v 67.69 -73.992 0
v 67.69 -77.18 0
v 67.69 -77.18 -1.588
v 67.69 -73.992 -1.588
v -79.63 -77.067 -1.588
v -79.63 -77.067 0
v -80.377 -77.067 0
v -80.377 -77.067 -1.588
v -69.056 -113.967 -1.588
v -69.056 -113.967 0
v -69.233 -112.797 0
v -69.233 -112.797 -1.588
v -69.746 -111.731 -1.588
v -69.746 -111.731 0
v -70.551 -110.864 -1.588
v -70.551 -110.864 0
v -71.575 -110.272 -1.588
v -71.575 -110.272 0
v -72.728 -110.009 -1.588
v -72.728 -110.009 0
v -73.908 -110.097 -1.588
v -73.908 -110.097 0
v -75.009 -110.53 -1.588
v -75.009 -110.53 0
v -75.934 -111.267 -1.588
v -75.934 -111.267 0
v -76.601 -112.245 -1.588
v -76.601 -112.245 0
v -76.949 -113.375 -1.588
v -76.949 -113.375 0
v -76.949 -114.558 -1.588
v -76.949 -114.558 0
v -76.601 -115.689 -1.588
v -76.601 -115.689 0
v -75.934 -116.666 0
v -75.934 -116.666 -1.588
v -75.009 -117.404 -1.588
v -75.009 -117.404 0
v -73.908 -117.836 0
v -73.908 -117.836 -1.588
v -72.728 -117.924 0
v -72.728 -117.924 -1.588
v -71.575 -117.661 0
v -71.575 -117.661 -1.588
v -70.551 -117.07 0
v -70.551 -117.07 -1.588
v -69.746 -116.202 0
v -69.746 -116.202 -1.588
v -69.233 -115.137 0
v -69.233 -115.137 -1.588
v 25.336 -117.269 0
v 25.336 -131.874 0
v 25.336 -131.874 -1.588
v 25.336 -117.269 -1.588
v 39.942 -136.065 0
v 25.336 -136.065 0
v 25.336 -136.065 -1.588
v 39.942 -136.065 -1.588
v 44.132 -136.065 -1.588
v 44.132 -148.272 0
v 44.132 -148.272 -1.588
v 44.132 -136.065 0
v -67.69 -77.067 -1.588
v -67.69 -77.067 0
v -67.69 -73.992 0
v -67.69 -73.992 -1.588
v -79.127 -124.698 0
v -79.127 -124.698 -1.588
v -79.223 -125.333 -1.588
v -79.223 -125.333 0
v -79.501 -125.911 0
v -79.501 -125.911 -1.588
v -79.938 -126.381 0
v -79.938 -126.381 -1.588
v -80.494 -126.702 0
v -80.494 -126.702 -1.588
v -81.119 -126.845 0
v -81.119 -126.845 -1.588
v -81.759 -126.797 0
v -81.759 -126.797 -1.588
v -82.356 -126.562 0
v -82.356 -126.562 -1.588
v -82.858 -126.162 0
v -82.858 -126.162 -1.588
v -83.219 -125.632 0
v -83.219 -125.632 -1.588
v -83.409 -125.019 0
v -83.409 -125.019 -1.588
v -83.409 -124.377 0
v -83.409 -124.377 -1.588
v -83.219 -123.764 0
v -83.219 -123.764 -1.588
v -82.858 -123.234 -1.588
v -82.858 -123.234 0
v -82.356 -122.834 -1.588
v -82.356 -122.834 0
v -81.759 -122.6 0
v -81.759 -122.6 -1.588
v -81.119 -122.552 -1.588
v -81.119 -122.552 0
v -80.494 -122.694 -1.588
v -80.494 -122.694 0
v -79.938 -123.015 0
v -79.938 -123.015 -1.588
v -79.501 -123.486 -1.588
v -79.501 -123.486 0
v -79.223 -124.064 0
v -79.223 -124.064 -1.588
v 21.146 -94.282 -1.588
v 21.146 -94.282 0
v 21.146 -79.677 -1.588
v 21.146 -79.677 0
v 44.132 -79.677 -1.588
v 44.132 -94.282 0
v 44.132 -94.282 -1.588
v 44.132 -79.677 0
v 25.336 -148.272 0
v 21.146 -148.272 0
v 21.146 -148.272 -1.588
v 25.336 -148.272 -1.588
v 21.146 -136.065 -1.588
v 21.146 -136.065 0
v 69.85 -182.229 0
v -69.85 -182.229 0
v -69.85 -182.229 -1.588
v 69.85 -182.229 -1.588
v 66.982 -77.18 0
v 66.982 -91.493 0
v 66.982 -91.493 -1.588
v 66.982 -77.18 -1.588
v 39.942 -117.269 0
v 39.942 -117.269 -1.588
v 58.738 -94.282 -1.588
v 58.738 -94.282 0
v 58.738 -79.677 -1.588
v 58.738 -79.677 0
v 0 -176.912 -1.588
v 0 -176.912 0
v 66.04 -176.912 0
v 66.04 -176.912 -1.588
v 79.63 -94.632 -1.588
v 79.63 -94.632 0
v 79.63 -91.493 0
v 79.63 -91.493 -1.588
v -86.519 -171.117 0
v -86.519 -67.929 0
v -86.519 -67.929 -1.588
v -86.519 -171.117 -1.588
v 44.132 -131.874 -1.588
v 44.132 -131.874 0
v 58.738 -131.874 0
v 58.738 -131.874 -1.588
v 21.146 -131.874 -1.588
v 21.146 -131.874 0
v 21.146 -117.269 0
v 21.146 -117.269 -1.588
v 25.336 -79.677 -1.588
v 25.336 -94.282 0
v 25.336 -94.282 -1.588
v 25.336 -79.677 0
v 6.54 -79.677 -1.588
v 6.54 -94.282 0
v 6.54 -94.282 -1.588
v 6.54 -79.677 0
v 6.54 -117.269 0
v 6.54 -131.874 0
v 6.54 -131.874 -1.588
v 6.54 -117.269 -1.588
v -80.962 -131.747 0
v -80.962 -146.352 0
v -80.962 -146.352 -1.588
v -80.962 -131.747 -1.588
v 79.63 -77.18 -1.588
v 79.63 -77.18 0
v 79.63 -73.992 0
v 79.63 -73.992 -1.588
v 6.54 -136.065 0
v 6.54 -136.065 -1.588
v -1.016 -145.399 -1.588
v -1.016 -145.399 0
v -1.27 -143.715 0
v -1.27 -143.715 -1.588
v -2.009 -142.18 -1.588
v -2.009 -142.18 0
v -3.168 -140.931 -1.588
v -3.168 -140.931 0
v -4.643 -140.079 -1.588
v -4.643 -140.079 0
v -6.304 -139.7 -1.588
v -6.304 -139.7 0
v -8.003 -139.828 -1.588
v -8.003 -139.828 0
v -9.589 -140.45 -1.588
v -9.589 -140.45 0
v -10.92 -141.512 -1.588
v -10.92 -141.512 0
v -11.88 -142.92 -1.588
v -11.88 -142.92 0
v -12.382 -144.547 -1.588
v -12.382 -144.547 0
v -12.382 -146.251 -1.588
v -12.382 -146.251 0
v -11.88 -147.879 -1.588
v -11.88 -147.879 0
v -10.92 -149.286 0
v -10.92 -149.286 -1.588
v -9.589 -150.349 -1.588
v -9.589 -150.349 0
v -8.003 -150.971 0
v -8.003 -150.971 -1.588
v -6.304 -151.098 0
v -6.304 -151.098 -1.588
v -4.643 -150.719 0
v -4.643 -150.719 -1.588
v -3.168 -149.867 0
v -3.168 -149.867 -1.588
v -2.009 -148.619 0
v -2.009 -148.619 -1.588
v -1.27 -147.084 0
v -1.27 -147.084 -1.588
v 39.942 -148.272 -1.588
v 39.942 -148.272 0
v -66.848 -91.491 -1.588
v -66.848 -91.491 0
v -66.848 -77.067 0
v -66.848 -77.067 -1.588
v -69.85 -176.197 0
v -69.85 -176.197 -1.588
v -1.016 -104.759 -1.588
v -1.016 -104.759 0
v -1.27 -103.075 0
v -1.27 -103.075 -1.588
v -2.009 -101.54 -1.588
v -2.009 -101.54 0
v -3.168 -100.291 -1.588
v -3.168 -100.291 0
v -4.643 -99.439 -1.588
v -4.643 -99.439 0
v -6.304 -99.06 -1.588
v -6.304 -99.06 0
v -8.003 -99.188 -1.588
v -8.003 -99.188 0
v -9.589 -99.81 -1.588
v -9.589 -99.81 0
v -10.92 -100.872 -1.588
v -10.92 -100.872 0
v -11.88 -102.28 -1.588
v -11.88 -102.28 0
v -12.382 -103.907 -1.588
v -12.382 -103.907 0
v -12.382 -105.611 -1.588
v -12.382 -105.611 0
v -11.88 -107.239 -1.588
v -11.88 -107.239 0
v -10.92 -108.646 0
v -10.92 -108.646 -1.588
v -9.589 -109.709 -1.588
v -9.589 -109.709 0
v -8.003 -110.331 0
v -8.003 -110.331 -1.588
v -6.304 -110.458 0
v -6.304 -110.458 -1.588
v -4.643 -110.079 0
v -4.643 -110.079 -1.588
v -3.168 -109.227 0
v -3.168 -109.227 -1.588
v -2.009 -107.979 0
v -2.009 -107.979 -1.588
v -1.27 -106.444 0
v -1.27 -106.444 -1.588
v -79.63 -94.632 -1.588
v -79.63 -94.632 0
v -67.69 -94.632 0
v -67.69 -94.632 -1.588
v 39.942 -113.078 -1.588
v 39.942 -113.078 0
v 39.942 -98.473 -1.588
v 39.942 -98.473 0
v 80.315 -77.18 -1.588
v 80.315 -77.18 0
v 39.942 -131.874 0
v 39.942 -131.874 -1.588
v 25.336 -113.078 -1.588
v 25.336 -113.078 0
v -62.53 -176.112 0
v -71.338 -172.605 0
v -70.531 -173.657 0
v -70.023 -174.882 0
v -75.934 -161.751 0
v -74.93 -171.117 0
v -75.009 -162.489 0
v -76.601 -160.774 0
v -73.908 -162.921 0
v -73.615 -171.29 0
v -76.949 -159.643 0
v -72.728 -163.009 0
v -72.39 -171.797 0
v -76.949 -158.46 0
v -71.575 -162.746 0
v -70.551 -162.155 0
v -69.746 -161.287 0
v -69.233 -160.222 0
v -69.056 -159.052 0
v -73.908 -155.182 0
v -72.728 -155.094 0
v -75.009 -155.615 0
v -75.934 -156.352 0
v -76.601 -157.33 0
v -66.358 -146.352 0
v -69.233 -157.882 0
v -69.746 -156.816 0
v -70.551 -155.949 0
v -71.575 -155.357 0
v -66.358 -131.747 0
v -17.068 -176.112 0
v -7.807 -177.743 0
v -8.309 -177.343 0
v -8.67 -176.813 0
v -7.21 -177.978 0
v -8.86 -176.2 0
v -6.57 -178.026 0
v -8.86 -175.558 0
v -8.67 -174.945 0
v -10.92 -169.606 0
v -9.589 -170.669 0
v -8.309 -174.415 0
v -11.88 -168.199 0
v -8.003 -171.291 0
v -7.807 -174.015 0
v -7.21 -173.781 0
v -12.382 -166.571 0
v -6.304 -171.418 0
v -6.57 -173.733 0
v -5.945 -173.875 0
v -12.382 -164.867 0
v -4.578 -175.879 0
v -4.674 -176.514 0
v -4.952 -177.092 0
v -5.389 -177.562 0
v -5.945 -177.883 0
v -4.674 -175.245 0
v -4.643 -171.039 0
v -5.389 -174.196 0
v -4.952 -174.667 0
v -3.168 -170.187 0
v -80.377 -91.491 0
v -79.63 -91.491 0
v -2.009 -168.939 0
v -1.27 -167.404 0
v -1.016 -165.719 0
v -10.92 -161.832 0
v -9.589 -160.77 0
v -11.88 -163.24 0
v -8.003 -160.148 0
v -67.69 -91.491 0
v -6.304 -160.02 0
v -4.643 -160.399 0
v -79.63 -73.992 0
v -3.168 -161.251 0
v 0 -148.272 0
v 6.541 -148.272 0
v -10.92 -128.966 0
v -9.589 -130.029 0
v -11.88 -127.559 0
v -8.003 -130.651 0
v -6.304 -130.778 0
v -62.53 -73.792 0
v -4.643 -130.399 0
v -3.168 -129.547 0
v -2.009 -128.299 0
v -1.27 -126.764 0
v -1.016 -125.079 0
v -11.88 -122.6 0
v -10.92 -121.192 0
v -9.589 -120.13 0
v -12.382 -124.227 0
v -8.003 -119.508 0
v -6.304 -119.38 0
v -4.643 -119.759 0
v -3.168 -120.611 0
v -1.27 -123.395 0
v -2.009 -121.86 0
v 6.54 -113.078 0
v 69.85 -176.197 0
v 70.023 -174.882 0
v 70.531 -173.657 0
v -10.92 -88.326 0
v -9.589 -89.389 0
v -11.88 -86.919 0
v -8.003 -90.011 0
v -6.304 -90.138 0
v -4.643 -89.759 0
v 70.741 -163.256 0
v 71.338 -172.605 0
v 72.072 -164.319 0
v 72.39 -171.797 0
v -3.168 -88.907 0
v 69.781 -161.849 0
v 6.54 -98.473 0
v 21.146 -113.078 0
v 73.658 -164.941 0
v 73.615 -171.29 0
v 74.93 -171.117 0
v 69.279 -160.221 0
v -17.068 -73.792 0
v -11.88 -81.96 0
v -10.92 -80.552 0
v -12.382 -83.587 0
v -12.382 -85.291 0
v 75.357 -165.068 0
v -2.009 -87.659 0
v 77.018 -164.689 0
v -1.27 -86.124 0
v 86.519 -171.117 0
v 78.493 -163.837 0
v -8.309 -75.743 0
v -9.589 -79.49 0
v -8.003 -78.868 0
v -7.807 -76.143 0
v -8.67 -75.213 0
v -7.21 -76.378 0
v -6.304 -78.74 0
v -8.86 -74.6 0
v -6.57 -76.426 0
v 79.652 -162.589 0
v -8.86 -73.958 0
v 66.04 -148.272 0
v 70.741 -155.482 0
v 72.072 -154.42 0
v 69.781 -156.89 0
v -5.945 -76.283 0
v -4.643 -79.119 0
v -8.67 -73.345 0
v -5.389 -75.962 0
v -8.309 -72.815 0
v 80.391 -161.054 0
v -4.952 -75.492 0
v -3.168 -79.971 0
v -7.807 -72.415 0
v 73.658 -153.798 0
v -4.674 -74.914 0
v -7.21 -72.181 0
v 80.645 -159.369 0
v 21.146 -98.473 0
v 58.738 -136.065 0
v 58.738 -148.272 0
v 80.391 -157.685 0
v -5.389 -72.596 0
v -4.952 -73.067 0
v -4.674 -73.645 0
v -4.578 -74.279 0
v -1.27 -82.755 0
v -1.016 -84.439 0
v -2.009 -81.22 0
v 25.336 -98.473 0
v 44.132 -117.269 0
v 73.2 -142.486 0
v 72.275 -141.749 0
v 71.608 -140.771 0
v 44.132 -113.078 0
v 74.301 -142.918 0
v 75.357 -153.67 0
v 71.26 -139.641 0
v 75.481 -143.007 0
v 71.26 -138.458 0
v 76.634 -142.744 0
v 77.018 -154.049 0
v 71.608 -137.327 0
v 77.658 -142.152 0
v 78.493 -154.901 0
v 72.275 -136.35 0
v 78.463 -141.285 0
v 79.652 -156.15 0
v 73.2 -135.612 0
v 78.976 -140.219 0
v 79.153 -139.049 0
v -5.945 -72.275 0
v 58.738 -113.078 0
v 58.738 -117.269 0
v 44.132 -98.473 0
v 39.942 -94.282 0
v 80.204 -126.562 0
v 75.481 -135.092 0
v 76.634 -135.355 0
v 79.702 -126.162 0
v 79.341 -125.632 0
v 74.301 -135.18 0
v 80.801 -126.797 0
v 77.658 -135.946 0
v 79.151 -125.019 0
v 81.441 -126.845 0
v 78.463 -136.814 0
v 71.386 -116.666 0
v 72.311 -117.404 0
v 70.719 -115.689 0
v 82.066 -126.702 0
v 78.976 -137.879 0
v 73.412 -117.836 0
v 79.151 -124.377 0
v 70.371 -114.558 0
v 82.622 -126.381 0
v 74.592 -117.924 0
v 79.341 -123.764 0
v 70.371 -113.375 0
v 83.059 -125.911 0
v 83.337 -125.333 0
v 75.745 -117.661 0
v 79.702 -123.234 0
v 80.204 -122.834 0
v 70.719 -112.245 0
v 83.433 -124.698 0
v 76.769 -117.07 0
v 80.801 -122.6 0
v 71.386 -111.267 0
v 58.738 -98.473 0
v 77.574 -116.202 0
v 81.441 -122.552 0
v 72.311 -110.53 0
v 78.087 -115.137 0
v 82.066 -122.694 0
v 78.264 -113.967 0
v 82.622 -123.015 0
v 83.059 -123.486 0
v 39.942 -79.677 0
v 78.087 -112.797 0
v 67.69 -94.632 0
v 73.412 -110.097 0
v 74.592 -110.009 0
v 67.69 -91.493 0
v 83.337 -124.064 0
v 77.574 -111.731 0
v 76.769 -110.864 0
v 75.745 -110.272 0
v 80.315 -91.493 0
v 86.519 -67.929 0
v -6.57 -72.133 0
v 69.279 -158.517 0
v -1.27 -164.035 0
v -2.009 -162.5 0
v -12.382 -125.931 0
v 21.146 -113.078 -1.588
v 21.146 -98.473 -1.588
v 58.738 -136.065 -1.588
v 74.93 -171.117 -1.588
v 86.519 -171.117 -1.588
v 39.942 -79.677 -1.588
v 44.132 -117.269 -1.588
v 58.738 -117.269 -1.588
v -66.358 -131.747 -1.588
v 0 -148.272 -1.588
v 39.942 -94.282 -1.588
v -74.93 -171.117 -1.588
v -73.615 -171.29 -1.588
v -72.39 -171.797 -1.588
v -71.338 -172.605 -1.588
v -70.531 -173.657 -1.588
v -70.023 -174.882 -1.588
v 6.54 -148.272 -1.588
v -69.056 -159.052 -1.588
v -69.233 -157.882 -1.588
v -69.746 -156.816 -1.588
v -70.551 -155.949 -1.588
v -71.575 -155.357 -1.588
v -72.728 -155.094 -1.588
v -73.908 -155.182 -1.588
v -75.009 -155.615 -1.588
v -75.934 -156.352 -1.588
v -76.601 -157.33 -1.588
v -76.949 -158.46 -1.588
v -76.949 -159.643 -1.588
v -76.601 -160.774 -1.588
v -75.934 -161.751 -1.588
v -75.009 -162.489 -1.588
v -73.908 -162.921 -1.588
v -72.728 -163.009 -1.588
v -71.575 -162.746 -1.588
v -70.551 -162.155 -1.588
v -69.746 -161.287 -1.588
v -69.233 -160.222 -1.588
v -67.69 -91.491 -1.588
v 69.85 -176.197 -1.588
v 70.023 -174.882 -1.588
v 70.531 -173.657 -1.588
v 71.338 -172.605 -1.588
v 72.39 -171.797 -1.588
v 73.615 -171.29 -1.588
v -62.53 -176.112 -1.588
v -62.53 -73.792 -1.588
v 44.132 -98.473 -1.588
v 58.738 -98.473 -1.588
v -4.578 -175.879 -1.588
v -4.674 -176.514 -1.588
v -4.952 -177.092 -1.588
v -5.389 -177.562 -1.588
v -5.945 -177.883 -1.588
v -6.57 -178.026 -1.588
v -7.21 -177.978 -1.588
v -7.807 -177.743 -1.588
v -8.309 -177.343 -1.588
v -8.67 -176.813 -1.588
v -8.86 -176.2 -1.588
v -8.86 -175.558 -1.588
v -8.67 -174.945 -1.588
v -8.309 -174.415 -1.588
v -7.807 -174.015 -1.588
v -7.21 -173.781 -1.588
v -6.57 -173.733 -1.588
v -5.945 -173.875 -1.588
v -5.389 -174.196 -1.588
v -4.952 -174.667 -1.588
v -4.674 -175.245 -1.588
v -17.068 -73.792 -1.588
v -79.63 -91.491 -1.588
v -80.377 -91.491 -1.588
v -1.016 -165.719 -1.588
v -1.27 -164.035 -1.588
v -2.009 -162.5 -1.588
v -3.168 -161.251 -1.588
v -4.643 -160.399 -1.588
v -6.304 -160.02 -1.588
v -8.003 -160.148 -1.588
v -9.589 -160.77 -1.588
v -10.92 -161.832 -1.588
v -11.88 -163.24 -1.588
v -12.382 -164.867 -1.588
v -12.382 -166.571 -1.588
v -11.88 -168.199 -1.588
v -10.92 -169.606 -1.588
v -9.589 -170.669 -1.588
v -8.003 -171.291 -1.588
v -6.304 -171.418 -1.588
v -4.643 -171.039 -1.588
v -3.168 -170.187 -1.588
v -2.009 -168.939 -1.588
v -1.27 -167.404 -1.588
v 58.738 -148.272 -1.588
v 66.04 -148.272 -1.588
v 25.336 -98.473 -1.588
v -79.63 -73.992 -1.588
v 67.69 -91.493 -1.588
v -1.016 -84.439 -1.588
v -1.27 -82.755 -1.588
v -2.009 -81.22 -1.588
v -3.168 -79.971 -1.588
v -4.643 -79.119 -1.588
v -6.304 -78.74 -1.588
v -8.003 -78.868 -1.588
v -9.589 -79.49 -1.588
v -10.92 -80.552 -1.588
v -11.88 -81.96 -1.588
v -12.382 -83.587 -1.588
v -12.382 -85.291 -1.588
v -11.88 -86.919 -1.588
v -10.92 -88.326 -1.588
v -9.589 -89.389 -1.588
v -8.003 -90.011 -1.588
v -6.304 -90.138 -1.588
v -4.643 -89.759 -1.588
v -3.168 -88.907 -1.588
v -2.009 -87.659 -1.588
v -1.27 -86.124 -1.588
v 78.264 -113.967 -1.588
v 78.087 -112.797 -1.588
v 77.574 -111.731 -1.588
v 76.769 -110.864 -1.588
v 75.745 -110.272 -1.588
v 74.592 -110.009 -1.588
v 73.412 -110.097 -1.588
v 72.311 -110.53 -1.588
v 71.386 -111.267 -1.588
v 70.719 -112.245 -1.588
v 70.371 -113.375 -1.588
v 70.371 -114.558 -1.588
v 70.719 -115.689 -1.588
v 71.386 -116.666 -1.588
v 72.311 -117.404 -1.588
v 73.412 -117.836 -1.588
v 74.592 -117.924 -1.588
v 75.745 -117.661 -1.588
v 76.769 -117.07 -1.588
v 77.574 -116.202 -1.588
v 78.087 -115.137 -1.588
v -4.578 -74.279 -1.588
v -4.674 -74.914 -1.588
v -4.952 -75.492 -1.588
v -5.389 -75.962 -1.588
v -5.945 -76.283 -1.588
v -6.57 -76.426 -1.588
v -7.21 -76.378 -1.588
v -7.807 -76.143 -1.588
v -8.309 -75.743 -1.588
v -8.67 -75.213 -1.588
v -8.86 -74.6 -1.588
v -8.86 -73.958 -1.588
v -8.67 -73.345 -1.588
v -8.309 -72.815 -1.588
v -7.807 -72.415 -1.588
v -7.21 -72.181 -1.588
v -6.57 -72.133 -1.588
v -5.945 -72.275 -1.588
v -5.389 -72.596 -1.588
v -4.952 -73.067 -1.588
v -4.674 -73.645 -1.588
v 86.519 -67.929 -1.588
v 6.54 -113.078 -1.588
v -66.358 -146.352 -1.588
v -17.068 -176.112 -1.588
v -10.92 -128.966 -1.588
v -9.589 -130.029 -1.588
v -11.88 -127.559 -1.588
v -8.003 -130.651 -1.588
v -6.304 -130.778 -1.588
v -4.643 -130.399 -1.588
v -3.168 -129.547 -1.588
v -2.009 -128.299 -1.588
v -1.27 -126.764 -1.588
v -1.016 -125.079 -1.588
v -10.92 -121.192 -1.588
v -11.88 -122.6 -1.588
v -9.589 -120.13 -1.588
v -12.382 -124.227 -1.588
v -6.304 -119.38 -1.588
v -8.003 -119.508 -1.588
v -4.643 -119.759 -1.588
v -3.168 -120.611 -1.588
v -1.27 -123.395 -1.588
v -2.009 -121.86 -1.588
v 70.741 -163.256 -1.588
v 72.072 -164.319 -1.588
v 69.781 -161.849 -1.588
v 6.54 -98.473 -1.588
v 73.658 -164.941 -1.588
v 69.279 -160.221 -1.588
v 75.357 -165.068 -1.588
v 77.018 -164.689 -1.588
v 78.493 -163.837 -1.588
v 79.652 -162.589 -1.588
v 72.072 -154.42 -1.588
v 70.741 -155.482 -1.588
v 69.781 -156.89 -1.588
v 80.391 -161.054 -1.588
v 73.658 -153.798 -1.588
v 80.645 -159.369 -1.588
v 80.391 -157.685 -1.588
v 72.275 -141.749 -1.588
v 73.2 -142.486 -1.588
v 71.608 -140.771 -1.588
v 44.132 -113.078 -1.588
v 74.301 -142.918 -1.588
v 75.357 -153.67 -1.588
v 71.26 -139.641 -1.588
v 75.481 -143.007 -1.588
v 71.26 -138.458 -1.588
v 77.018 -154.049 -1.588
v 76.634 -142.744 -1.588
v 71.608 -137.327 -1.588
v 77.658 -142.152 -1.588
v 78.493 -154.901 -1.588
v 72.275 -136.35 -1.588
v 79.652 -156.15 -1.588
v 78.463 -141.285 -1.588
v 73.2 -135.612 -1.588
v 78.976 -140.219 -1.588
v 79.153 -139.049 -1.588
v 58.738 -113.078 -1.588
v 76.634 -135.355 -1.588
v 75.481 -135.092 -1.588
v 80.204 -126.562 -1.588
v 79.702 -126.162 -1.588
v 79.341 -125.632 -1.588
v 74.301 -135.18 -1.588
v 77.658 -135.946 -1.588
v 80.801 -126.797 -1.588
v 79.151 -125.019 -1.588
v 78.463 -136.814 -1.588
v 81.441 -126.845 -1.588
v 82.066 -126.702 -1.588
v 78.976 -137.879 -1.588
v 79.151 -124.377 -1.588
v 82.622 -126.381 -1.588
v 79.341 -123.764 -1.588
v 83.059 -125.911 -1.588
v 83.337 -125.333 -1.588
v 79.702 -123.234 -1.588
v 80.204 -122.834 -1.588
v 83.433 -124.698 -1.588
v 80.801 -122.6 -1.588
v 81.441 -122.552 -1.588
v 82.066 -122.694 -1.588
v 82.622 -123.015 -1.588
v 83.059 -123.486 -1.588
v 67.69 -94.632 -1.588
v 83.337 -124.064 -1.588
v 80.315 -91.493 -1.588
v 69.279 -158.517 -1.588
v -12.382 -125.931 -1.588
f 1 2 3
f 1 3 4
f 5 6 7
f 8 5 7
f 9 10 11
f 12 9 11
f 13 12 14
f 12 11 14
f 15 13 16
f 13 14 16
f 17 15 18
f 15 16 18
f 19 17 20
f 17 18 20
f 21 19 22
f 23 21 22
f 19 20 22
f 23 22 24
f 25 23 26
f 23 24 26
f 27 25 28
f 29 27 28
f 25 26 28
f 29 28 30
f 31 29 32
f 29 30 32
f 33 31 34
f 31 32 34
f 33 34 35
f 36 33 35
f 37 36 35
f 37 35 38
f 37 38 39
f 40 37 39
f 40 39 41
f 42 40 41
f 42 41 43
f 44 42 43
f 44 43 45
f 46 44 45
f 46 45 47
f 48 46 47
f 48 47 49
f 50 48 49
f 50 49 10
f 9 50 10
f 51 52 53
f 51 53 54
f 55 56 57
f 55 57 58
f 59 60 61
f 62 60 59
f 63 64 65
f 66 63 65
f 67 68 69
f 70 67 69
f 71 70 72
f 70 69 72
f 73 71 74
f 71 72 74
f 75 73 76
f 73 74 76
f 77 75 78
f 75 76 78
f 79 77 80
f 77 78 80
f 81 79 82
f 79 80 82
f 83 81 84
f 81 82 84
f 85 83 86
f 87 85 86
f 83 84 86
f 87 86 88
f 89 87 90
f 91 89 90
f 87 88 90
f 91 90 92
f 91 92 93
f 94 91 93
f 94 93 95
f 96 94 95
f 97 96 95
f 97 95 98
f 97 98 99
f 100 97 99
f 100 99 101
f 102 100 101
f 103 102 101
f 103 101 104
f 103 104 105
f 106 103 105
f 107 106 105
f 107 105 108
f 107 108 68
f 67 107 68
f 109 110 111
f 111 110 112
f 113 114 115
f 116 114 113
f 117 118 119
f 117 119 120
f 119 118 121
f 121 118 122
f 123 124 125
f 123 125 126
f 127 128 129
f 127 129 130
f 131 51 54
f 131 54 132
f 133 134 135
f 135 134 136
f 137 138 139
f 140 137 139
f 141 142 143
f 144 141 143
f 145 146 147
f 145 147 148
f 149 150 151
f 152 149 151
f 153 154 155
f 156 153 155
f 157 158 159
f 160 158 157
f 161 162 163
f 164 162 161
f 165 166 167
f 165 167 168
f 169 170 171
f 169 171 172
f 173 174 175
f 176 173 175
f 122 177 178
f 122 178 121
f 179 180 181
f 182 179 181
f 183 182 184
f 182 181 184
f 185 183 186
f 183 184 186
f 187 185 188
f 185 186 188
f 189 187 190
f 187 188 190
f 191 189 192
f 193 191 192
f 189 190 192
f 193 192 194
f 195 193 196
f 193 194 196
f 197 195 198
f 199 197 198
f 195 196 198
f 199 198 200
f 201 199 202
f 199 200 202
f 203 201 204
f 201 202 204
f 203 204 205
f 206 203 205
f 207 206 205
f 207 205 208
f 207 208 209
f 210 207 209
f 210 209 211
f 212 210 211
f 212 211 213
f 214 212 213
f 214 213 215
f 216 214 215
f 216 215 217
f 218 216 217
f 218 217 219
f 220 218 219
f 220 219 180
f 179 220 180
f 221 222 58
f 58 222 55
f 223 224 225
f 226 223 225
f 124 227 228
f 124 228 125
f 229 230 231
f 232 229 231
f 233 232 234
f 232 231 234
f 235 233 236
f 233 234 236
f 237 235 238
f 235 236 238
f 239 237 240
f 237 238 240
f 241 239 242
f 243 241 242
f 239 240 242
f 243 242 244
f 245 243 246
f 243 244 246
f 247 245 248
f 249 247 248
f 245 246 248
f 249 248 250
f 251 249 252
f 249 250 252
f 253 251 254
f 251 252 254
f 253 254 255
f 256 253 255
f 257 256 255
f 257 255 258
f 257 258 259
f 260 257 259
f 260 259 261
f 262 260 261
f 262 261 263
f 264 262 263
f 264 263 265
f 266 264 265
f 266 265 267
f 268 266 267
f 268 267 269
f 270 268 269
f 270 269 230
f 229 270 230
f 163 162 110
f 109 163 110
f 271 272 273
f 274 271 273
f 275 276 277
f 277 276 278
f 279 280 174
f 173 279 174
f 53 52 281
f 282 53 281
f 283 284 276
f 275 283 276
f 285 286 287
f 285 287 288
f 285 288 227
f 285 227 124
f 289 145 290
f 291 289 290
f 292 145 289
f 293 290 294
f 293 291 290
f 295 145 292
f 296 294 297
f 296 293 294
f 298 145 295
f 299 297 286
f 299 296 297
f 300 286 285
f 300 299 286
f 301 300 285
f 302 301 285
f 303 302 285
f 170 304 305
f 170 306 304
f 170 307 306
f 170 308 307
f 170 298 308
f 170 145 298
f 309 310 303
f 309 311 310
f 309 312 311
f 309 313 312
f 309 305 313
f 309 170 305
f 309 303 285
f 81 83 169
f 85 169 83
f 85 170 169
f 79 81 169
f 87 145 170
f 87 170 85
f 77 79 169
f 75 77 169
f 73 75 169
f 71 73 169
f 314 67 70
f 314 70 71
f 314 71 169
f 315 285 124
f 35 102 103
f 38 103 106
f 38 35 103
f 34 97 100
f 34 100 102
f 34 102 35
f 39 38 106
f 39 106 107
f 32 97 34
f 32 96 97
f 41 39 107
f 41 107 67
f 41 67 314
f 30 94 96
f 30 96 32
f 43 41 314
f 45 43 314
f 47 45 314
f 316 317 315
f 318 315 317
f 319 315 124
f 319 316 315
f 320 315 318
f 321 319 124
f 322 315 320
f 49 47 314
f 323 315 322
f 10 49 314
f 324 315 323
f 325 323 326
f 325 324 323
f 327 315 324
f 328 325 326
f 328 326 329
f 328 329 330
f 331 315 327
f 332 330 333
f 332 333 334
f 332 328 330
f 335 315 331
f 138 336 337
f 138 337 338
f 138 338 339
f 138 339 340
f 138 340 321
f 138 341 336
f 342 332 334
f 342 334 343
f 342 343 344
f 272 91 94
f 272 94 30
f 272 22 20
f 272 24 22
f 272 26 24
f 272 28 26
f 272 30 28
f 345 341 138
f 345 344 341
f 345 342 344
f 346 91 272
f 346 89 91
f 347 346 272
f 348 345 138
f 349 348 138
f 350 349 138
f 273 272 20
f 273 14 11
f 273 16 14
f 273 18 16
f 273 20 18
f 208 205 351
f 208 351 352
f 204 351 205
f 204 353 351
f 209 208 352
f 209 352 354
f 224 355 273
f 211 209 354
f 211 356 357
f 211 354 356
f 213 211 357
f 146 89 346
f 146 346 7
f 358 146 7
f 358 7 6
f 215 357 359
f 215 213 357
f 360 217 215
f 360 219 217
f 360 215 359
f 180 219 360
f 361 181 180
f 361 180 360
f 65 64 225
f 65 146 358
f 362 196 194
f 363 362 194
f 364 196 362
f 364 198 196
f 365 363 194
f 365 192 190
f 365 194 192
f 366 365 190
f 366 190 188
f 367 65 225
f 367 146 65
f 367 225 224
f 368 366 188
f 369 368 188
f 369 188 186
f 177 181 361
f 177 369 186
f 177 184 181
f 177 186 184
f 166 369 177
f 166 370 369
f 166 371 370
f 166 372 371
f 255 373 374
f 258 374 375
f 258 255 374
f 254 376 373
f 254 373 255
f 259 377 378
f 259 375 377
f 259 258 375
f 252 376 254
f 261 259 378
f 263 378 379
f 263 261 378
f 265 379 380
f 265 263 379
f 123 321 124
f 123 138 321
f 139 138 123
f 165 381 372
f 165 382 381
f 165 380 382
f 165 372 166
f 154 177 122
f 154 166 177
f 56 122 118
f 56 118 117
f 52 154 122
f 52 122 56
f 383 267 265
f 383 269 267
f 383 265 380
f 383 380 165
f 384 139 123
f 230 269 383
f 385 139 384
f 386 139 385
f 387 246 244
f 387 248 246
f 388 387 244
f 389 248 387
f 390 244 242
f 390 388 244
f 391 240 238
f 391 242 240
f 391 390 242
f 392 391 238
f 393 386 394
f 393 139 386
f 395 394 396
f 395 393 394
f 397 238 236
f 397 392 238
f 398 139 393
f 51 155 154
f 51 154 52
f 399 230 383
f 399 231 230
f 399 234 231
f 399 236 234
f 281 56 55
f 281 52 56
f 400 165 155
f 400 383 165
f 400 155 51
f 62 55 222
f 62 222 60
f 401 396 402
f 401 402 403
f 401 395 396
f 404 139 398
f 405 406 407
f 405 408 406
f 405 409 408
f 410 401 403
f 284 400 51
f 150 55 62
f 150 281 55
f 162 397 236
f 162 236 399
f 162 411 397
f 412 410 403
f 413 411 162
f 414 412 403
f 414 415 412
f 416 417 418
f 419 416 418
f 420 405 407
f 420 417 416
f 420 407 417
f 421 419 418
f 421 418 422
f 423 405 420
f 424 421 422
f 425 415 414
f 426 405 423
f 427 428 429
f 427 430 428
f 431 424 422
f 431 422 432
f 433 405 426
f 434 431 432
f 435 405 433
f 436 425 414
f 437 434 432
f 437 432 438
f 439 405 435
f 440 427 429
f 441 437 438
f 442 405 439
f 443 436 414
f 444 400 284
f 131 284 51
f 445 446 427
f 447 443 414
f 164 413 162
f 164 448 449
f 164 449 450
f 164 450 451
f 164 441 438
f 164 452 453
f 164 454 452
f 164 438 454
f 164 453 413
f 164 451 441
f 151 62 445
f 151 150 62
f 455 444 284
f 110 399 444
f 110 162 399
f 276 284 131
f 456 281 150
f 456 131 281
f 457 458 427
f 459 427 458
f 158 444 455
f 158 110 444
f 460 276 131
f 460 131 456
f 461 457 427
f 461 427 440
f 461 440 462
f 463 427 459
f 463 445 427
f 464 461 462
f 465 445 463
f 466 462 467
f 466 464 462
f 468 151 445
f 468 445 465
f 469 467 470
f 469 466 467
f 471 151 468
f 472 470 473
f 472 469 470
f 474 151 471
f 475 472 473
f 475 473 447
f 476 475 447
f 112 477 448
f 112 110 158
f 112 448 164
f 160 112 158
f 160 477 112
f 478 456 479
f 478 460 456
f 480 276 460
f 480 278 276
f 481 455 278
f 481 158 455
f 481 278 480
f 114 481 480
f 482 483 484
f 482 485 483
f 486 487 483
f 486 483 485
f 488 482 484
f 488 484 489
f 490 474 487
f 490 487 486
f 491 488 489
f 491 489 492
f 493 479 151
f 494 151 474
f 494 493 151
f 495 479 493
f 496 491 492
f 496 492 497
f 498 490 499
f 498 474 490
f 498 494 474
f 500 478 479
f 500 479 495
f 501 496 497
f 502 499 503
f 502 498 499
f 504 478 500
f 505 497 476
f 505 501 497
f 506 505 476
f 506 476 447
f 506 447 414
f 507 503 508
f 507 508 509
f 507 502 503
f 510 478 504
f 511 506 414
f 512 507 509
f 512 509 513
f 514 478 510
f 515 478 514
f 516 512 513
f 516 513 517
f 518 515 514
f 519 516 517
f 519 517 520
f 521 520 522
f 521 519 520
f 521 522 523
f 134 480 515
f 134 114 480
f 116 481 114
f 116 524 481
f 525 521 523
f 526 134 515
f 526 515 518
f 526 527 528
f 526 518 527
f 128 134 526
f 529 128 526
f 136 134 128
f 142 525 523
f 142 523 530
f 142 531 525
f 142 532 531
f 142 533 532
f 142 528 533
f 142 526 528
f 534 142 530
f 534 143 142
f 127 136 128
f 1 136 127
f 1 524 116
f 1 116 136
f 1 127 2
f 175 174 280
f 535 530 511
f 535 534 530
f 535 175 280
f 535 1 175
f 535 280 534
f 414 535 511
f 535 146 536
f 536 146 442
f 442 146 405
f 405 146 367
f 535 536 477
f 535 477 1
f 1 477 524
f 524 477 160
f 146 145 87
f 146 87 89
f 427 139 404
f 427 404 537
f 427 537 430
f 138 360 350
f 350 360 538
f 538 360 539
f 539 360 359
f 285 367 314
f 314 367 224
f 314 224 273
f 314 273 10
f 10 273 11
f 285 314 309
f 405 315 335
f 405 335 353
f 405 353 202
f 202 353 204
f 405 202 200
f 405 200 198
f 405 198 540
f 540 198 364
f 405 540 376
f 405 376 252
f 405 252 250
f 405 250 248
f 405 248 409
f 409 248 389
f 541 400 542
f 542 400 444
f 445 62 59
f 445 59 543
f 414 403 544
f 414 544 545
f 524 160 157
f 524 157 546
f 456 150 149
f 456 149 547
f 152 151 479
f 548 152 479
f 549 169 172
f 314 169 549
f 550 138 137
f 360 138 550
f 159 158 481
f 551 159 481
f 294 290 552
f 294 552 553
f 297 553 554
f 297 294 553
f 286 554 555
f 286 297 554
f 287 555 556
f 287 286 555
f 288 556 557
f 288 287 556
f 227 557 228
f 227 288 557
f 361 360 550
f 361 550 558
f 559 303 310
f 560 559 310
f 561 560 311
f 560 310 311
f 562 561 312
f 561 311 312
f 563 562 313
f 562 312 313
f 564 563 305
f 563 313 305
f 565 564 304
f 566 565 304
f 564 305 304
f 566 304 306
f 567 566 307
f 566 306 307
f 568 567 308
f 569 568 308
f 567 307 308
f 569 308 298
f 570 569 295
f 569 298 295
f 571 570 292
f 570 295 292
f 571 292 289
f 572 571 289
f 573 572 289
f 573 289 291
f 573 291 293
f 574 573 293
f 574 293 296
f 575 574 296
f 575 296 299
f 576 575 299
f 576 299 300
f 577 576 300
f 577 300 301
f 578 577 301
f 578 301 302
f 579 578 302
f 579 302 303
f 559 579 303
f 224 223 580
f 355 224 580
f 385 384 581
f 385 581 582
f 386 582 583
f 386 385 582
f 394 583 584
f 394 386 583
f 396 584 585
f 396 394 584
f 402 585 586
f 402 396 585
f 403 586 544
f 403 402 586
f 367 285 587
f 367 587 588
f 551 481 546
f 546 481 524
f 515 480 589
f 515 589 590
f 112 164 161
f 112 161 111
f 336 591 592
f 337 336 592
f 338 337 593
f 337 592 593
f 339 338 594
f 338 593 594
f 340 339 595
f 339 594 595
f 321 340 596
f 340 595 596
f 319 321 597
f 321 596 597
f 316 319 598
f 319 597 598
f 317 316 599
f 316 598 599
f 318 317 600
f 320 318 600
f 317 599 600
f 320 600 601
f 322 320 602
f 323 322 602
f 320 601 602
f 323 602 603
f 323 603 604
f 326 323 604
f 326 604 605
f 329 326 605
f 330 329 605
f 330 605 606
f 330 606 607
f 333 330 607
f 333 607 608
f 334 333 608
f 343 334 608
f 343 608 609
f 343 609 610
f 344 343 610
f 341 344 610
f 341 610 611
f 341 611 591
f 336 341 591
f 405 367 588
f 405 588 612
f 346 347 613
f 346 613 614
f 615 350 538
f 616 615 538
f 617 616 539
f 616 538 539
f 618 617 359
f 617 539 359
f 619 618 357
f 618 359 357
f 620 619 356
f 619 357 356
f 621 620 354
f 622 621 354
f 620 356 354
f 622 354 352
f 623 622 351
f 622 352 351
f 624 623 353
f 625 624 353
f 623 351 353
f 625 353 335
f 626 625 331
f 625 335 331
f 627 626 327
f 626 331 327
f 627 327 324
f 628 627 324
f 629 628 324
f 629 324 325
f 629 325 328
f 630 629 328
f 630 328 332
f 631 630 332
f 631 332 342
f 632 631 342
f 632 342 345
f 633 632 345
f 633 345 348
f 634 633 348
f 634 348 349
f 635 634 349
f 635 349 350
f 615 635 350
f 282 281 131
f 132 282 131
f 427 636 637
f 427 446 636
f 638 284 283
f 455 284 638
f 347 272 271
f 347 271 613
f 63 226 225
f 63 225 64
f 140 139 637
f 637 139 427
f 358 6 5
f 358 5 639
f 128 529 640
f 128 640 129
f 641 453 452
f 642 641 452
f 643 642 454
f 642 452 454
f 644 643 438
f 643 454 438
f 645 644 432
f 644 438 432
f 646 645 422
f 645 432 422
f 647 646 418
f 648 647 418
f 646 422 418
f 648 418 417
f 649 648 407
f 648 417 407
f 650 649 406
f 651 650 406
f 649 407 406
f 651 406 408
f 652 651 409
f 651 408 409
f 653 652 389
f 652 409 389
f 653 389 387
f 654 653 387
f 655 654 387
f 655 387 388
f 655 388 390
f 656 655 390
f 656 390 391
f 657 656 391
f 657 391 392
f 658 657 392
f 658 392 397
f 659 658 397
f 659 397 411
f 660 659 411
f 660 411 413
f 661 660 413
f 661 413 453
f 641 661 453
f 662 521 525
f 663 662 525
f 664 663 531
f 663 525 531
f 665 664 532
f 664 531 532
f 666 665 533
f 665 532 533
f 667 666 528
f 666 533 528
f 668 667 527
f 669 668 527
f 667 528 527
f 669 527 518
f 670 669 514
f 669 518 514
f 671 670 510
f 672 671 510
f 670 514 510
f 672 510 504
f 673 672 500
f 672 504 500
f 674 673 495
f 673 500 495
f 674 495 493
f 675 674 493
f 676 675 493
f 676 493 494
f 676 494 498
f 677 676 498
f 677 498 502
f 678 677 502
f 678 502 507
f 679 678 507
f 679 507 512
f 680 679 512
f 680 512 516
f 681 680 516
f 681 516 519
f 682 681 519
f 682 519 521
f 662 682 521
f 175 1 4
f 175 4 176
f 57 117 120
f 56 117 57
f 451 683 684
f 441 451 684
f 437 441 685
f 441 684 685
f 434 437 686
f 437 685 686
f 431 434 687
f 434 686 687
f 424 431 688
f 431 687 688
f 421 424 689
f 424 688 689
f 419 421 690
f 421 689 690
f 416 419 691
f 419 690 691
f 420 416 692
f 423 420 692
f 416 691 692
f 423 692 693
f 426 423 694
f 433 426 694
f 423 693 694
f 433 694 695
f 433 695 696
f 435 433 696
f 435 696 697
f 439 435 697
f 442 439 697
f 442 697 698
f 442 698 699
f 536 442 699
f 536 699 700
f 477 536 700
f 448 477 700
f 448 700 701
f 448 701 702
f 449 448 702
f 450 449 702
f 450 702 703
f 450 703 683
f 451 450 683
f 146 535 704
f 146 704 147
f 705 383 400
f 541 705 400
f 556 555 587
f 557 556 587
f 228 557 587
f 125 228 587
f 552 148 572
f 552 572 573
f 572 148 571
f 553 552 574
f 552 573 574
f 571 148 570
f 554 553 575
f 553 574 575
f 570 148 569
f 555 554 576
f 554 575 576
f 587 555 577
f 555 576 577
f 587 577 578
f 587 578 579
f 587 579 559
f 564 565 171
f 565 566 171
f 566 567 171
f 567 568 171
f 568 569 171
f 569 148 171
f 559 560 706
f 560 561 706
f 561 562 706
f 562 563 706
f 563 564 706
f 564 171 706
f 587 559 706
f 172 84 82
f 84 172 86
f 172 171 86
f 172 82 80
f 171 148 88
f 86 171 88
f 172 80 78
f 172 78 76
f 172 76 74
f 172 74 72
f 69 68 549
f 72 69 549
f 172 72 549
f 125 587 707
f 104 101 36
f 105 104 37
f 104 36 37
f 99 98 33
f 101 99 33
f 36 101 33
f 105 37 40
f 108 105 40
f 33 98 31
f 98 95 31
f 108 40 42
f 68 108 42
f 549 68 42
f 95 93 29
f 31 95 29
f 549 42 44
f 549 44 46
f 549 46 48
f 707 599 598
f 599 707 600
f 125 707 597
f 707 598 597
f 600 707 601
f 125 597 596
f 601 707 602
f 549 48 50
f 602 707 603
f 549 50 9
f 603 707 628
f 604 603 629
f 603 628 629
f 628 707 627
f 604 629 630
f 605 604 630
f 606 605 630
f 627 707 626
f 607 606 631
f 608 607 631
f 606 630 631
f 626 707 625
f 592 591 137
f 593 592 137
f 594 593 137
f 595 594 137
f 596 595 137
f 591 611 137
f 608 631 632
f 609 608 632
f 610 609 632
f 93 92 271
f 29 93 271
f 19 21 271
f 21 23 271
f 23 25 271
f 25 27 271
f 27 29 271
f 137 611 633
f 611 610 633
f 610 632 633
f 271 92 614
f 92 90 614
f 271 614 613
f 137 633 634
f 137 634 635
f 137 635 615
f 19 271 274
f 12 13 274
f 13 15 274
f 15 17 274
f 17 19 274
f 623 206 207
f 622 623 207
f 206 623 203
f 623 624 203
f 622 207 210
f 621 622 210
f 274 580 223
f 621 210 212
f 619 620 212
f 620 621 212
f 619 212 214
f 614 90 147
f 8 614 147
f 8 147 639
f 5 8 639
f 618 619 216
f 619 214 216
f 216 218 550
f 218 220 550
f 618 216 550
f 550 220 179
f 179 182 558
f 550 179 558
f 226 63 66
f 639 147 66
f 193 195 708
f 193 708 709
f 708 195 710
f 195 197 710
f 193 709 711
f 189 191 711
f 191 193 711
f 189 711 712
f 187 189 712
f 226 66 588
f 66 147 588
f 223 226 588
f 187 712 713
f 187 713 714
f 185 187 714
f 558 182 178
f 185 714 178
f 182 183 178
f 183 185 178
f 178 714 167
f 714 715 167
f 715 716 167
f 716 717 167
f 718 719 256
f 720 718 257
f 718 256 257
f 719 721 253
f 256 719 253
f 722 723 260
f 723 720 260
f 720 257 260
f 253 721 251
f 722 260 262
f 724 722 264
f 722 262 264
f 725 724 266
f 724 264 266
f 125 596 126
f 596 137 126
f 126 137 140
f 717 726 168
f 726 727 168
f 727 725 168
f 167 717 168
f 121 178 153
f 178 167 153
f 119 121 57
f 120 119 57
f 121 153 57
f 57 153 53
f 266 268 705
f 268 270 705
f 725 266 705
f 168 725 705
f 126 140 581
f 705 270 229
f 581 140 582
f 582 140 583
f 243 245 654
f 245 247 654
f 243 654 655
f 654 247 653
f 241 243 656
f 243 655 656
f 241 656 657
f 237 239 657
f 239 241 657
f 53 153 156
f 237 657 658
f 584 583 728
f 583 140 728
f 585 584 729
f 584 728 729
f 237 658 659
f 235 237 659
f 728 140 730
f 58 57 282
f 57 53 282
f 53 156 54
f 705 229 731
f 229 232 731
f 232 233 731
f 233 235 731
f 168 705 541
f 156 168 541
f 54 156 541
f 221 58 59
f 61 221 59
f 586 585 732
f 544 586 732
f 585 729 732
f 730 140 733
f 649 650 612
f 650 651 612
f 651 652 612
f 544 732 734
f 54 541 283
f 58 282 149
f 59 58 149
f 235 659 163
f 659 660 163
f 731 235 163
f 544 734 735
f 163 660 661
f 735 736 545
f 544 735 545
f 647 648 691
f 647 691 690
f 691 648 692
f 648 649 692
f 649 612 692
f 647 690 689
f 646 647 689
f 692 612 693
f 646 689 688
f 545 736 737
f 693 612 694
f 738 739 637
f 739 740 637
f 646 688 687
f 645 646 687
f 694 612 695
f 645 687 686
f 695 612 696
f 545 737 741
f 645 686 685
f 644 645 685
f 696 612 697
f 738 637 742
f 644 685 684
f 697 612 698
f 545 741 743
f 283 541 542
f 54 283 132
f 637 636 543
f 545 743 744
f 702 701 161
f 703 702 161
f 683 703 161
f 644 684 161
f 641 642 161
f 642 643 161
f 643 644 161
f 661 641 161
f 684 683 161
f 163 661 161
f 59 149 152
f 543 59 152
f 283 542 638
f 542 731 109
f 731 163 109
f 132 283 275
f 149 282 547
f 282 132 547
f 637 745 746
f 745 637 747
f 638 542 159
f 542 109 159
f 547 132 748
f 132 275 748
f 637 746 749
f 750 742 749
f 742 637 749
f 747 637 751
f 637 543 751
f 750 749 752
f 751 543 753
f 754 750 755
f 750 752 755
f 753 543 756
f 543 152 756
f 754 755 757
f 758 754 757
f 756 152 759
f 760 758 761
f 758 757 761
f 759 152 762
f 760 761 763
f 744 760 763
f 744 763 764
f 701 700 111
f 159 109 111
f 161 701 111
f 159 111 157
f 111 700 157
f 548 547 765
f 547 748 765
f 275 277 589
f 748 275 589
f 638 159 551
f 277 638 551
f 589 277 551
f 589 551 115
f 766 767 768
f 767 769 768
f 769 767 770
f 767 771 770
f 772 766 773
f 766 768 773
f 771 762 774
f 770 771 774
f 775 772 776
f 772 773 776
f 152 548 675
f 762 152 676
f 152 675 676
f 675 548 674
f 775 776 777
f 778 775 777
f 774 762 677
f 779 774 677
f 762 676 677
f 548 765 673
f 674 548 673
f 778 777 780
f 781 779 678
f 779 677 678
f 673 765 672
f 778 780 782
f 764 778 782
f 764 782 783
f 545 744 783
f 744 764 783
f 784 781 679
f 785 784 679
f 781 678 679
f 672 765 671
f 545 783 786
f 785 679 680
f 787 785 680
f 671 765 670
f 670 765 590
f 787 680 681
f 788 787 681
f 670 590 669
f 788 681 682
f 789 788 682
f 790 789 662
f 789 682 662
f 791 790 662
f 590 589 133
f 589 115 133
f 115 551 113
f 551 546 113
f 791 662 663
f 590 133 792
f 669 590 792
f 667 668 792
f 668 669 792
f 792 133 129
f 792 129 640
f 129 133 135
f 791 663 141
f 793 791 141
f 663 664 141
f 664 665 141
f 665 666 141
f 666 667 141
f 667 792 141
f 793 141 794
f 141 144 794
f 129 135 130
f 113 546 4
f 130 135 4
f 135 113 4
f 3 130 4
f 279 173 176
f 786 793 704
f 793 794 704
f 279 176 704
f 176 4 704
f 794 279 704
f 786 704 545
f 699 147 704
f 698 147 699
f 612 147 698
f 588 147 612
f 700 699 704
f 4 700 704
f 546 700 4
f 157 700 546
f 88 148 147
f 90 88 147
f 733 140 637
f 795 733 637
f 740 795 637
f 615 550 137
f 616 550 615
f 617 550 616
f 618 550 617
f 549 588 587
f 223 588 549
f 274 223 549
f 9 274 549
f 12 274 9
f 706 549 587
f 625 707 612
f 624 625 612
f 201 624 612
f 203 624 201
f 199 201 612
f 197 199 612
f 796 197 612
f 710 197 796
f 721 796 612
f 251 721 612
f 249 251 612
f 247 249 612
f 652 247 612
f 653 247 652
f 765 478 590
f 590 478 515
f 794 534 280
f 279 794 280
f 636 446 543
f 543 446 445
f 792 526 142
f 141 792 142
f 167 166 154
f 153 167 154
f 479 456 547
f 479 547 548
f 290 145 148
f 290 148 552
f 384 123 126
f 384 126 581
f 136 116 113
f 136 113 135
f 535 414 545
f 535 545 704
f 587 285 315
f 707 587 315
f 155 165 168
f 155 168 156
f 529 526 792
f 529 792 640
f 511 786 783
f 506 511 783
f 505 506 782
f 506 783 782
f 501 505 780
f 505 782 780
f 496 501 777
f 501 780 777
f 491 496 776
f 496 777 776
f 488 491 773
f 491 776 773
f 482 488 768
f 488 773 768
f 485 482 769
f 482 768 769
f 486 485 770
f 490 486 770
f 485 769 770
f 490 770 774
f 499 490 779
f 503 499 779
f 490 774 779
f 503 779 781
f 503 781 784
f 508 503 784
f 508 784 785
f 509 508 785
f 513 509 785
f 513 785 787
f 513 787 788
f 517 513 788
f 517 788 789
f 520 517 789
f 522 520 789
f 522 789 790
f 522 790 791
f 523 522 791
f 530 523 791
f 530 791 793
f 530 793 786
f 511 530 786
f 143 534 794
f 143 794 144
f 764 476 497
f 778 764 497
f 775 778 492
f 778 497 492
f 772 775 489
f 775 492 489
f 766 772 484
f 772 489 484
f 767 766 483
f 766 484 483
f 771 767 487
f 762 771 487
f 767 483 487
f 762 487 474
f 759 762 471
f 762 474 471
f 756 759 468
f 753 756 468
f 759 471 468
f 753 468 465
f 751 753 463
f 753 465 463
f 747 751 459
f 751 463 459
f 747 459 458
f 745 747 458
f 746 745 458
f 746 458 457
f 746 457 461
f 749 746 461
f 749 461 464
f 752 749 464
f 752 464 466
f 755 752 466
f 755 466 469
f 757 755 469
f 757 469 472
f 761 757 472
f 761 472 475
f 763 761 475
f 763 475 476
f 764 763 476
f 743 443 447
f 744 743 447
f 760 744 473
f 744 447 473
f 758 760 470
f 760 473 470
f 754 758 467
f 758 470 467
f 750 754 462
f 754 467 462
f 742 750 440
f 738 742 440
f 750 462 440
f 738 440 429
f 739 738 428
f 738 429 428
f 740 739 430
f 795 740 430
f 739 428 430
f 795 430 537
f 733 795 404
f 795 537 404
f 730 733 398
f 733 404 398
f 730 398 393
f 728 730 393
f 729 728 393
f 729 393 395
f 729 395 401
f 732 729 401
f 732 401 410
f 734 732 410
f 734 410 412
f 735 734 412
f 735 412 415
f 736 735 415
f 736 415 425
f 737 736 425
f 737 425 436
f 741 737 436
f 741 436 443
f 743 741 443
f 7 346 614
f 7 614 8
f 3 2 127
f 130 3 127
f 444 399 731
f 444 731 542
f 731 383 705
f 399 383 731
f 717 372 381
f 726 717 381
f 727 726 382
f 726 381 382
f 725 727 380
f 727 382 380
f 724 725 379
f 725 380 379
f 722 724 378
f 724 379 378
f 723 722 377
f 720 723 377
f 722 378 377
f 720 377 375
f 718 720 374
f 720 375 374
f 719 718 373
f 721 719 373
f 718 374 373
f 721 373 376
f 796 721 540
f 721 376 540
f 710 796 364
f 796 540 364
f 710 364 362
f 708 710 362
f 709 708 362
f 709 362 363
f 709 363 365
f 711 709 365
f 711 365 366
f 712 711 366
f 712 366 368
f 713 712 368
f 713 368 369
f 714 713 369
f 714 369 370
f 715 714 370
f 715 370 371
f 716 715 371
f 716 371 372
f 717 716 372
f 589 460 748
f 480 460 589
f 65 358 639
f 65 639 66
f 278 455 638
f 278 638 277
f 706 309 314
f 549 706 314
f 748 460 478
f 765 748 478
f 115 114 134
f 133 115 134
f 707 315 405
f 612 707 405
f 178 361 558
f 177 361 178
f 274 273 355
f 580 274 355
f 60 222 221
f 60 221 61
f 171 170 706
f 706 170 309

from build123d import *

# Parameters (mm, degrees)
BOSS_EXTRUDE1_DEPTH   = 1.5875
SKETCH3_R             = 4.445
SKETCH3_W             = 12.065
SKETCH3_H             = 12.065
CUT_EXTRUDE1_DEPTH    = 2.5875
SKETCH4_R             = 3.96875
CUT_EXTRUDE2_DEPTH    = 2.5875
SKETCH5_W             = 11.94
SKETCH5_H             = 20.64
SKETCH5_W_2           = 45.462
SKETCH5_H_2           = 102.32
SKETCH5_W_3           = 57
SKETCH5_H_3           = 15.1
CUT_EXTRUDE3_DEPTH    = 2.5875
SKETCH6_R             = 5.715
SKETCH6_W             = 14.605
SKETCH6_H             = 14.605
CUT_EXTRUDE4_DEPTH    = 2.5875
SKETCH7_W             = 66.04
SKETCH7_H             = 28.64
CUT_EXTRUDE5_DEPTH    = 2.5875
F_6_CLEARANCE_HOLE2_D = 4.3053
CUT_EXTRUDE6_START    = -1.5875
SKETCH12_W            = 13.529020254
SKETCH12_H            = 14.424558238
SKETCH12_W_2          = 13.332833864
SKETCH12_H_2          = 14.312726797
CUT_EXTRUDE6_DEPTH    = 1.5875


with BuildPart() as part:
    # Sketch1 → Boss-Extrude1 (new body)
    with BuildSketch(Plane.XY):
        with BuildLine():
            Line((74.93, -171.1167297), (86.51875, -171.1167297))
            Line((86.51875, -171.1167297), (86.51875, -67.9292297))
            Line((86.51875, -67.9292297), (-86.51875, -67.9292297))
            Line((-86.51875, -67.9292297), (-86.51875, -171.1167297))
            Line((-86.51875, -171.1167297), (-74.93, -171.1167297))
            ThreePointArc((-74.93, -171.1167297), (-71.337897552, -172.604627251), (-69.85, -176.1967297))
            Line((-69.85, -176.1967297), (-69.85, -182.2292297))
            Line((-69.85, -182.2292297), (69.85, -182.2292297))
            Line((69.85, -182.2292297), (69.85, -176.1967297))
            ThreePointArc((69.85, -176.1967297), (71.337897552, -172.604627251), (74.93, -171.1167297))
        make_face()
    extrude(amount=-BOSS_EXTRUDE1_DEPTH)

    # Sketch3 → Cut-Extrude1 (cut, through all)
    with BuildSketch(Plane.XY):
        with Locations((74.93, -159.3692297)):
            Circle(SKETCH3_R)
        with Locations((-6.731, -165.7192297)):
            Circle(SKETCH3_R)
        with Locations((-6.731, -145.3992297)):
            Circle(SKETCH3_R)
        with Locations((-6.731, -125.0792297)):
            Circle(SKETCH3_R)
        with Locations((-6.731, -104.7592297)):
            Circle(SKETCH3_R)
        with Locations((-6.731, -84.4392297)):
            Circle(SKETCH3_R)
        with Locations((-73.66, -139.0492297)):
            Rectangle(SKETCH3_W, SKETCH3_H)
        with Locations((13.843, -143.3672297)):
            Rectangle(SKETCH3_W, SKETCH3_H)
        with Locations((32.639, -143.3672297)):
            Rectangle(SKETCH3_W, SKETCH3_H)
        with Locations((51.435, -143.3672297)):
            Rectangle(SKETCH3_W, SKETCH3_H)
        with Locations((51.435, -124.5712297)):
            Rectangle(SKETCH3_W, SKETCH3_H)
        with Locations((32.639, -124.5712297)):
            Rectangle(SKETCH3_W, SKETCH3_H)
        with Locations((13.843, -124.5712297)):
            Rectangle(SKETCH3_W, SKETCH3_H)
        with Locations((13.843, -105.7752297)):
            Rectangle(SKETCH3_W, SKETCH3_H)
        with Locations((13.843, -86.9792297)):
            Rectangle(SKETCH3_W, SKETCH3_H)
        with Locations((32.639, -86.9792297)):
            Rectangle(SKETCH3_W, SKETCH3_H)
        with Locations((32.639, -105.7752297)):
            Rectangle(SKETCH3_W, SKETCH3_H)
        with Locations((51.435, -105.7752297)):
            Rectangle(SKETCH3_W, SKETCH3_H)
        with Locations((51.435, -86.9792297)):
            Rectangle(SKETCH3_W, SKETCH3_H)
    extrude(amount=-CUT_EXTRUDE1_DEPTH, mode=Mode.SUBTRACT)

    # Sketch4 → Cut-Extrude2 (cut, through all)
    with BuildSketch(Plane.XY):
        with Locations((-73.025, -113.9667297)):
            Circle(SKETCH4_R)
        with Locations((-73.025, -159.0517297)):
            Circle(SKETCH4_R)
        with Locations((74.295, -113.9667297)):
            Circle(SKETCH4_R)
        with Locations((75.184, -139.0492297)):
            Circle(SKETCH4_R)
    extrude(amount=-CUT_EXTRUDE2_DEPTH, mode=Mode.SUBTRACT)

    # Sketch5 → Cut-Extrude3 (cut, through all)
    with BuildSketch(Plane.XY):
        with Locations((-73.66, -84.3122297)):
            Rectangle(SKETCH5_W, SKETCH5_H)
        with Locations((73.66, -84.3122297)):
            Rectangle(SKETCH5_W, SKETCH5_H)
        with Locations((-39.799, -124.9522297)):
            Rectangle(SKETCH5_W_2, SKETCH5_H_2)
        with Locations((33.02, -165.4922297)):
            Rectangle(SKETCH5_W_3, SKETCH5_H_3)
    extrude(amount=-CUT_EXTRUDE3_DEPTH, mode=Mode.SUBTRACT)

    # Sketch6 → Cut-Extrude4 (cut, through all)
    with BuildSketch(Plane.XY):
        with Locations((74.93, -159.3692297)):
            Circle(SKETCH6_R)
        with Locations((-6.731, -165.7192297)):
            Circle(SKETCH6_R)
        with Locations((-6.731, -145.3992297)):
            Circle(SKETCH6_R)
        with Locations((-6.731, -125.0792297)):
            Circle(SKETCH6_R)
        with Locations((-6.731, -104.7592297)):
            Circle(SKETCH6_R)
        with Locations((-6.731, -84.4392297)):
            Circle(SKETCH6_R)
        with Locations((51.435, -143.3672297)):
            Rectangle(SKETCH6_W, SKETCH6_H)
        with Locations((51.435, -124.5712297)):
            Rectangle(SKETCH6_W, SKETCH6_H)
        with Locations((51.435, -105.7752297)):
            Rectangle(SKETCH6_W, SKETCH6_H)
        with Locations((51.435, -86.9792297)):
            Rectangle(SKETCH6_W, SKETCH6_H)
        with Locations((32.639, -143.3672297)):
            Rectangle(SKETCH6_W, SKETCH6_H)
        with Locations((32.639, -124.5712297)):
            Rectangle(SKETCH6_W, SKETCH6_H)
        with Locations((32.639, -105.7752297)):
            Rectangle(SKETCH6_W, SKETCH6_H)
        with Locations((32.639, -86.9792297)):
            Rectangle(SKETCH6_W, SKETCH6_H)
        with Locations((13.843, -86.9792297)):
            Rectangle(SKETCH6_W, SKETCH6_H)
        with Locations((13.843, -105.7752297)):
            Rectangle(SKETCH6_W, SKETCH6_H)
        with Locations((13.843, -124.5712297)):
            Rectangle(SKETCH6_W, SKETCH6_H)
        with Locations((13.843, -143.3672297)):
            Rectangle(SKETCH6_W, SKETCH6_H)
        with Locations((-73.66, -139.0492297)):
            Rectangle(SKETCH6_W, SKETCH6_H)
    extrude(amount=-CUT_EXTRUDE4_DEPTH, mode=Mode.SUBTRACT)

    # Sketch7 → Cut-Extrude5 (cut, through all)
    with BuildSketch(Plane.XY):
        with Locations((33.02, -162.5922297)):
            Rectangle(SKETCH7_W, SKETCH7_H)
    extrude(amount=-CUT_EXTRUDE5_DEPTH, mode=Mode.SUBTRACT)

    # #6 Clearance Hole2 (through all)
    with Locations(Plane(origin=(0, 0, 1.5875), x_dir=(-1, 0, 0), z_dir=(0, 0, 1))):
        with Locations((-81.28, 124.6982297), (6.731, 175.8792297), (81.28, 124.6982297), (6.731, 74.2792297)):
            Hole(F_6_CLEARANCE_HOLE2_D / 2)

    # Sketch12 → Cut-Extrude6 (cut)
    with BuildSketch(Plane(origin=(0, 0, -1.5875), x_dir=(-1, 0, 0), z_dir=(0, 0, -1)).offset(CUT_EXTRUDE6_START)):
        with Locations((73.612537257, -84.279184845)):
            Rectangle(SKETCH12_W, SKETCH12_H)
        with Locations((-73.648214967, -84.336507402)):
            Rectangle(SKETCH12_W_2, SKETCH12_H_2)
    extrude(amount=CUT_EXTRUDE6_DEPTH, mode=Mode.SUBTRACT)


solid = part.part
